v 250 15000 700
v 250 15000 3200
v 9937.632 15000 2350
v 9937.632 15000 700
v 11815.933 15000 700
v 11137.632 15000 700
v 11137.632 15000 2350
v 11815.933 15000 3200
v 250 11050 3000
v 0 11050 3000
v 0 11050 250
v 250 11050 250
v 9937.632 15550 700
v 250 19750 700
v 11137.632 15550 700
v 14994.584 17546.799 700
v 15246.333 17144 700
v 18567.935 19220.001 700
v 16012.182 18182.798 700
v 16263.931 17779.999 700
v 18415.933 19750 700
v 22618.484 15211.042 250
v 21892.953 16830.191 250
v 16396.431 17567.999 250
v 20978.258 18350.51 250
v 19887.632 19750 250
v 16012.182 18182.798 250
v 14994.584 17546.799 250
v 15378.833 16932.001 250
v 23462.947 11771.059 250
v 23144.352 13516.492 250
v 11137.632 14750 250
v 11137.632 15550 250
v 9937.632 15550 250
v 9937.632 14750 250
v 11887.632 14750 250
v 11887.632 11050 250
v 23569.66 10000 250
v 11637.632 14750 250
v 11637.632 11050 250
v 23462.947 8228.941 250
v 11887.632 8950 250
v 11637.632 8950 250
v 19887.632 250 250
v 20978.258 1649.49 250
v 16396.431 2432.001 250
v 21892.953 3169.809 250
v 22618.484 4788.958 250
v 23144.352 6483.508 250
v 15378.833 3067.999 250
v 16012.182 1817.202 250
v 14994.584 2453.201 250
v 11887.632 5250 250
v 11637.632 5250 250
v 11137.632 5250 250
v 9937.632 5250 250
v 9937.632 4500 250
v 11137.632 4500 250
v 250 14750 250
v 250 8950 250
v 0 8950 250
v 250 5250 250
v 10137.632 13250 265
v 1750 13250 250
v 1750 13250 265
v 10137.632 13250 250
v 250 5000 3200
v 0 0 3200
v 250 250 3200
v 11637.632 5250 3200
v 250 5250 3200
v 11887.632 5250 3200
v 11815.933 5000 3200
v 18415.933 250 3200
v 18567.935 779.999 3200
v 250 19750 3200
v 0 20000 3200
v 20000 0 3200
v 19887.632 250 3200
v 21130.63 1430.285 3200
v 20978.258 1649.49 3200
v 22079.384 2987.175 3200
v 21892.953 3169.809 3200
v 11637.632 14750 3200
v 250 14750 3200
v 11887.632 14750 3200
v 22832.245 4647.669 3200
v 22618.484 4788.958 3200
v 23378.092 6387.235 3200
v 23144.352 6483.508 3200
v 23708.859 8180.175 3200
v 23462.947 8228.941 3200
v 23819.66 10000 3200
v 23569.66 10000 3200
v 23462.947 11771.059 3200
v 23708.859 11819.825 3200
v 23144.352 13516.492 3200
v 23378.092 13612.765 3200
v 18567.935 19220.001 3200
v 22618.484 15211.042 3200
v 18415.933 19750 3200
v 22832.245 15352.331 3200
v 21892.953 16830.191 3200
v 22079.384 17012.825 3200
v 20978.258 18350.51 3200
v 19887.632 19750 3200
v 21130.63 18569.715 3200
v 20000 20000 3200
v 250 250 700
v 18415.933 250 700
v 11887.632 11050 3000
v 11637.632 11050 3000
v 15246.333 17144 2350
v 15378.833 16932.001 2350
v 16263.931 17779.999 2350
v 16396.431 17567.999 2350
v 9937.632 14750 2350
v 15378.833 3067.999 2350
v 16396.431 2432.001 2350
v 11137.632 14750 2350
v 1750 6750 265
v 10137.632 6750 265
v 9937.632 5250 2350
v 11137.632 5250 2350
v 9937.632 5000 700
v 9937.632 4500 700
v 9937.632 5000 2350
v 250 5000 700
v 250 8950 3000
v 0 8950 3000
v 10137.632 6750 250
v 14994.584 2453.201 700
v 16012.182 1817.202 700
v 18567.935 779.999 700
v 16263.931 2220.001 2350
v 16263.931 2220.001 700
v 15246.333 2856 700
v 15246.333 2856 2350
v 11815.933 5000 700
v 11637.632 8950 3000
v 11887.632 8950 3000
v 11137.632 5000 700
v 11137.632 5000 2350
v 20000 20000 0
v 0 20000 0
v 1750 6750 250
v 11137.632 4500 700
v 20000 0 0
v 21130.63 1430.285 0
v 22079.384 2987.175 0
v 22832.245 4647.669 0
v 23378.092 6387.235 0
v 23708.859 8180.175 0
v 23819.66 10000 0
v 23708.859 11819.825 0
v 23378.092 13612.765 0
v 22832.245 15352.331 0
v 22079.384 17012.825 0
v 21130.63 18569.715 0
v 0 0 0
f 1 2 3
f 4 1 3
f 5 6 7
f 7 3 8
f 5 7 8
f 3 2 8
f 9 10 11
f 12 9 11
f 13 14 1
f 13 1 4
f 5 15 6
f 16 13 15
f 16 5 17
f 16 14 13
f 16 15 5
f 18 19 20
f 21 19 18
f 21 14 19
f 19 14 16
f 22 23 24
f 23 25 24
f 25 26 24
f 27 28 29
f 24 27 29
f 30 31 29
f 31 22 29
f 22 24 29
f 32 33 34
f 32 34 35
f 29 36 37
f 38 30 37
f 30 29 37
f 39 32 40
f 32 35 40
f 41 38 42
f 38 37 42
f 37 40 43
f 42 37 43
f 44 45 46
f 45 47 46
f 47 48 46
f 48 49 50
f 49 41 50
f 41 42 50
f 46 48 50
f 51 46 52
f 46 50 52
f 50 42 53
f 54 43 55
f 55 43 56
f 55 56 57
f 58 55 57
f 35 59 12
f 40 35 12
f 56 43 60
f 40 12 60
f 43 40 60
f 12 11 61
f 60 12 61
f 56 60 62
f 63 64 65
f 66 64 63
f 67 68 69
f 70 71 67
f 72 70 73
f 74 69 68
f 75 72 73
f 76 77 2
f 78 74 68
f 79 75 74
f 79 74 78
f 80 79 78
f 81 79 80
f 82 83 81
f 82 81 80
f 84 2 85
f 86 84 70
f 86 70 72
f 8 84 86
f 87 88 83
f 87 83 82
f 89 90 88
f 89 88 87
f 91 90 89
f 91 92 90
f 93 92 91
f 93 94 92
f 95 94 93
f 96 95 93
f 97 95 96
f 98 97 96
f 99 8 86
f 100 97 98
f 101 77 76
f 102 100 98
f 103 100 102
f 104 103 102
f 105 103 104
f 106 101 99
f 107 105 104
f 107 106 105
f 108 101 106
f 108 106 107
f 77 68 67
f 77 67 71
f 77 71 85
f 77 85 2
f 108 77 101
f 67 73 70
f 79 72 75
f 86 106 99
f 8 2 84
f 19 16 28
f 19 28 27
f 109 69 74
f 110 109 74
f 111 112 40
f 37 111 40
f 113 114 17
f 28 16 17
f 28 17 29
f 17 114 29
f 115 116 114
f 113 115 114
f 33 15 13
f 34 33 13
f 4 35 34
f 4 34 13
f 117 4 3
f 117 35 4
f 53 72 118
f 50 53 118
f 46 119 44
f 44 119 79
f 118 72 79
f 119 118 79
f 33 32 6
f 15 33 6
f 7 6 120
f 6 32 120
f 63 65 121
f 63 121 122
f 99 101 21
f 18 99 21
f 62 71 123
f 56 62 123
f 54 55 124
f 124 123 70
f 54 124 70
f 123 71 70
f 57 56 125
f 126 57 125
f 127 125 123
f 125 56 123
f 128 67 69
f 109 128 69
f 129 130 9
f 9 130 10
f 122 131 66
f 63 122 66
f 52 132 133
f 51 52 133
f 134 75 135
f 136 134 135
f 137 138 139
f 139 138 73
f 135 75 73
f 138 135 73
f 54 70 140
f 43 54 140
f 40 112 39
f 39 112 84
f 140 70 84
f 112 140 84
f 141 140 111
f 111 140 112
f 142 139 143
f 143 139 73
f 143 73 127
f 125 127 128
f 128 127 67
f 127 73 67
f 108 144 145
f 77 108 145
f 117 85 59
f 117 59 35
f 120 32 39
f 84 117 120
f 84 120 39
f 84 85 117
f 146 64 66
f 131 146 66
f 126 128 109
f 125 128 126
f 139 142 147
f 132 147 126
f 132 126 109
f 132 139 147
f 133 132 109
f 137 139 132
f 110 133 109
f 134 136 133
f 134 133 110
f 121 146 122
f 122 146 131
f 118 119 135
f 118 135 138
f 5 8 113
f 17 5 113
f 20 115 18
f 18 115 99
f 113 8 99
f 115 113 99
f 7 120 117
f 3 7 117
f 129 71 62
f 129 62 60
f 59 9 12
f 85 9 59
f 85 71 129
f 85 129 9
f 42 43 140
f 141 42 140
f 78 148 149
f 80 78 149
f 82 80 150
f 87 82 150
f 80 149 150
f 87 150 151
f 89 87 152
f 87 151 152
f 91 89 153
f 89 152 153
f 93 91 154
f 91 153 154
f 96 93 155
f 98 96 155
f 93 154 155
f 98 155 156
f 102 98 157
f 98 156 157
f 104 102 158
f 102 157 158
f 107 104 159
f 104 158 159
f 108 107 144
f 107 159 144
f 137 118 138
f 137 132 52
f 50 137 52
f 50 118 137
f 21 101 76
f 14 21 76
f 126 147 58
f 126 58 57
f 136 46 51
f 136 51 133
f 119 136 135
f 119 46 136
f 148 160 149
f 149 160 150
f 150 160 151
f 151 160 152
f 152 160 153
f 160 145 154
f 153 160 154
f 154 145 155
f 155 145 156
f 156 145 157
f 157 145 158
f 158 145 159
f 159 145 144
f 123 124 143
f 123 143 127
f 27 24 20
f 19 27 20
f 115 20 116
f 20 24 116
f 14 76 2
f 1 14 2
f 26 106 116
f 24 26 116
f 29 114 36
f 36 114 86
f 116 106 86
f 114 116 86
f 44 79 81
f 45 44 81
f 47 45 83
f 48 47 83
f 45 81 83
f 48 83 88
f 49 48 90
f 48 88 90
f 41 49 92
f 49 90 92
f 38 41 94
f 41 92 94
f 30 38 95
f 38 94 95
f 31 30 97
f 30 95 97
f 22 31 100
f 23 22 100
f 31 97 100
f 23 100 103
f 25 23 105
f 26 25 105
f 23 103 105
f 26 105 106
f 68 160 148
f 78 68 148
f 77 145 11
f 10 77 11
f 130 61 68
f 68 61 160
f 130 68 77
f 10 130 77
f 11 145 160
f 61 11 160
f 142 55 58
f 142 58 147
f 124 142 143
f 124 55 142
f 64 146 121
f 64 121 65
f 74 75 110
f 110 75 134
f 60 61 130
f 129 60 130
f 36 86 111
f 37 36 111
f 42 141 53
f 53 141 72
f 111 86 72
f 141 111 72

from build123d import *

# Parameters (mm, degrees)
F1_DEPTH      = 3200
F2_W          = 11387.6319230904
F2_H          = 9500
F3_DEPTH      = 2950
F4_DEPTH      = 2500
F6_DEPTH      = 15000
F8_W          = 1200
F8_H          = 2100
F9_DEPTH      = 750
F9_DEPTH_BACK = 10300
F12_DEPTH     = 725
F13_W         = 8387.6319230904
F13_H         = 6500
F14_DEPTH     = 15
F15_SIZE      = 1000


# Not quite as in the source:
# - a pattern or mirror of a feature is missing from the dataset's text; its kind, count and spacing are read off the source's solid


with BuildPart() as f1:
    # F0 (on Top) → F1 (new body)
    with BuildSketch(Plane.XY):
        Polygon((0, 20000), (0, 0), (20000, 0), (20000, 10000), (20000, 20000), align=None)
        with BuildLine():
            Line((20000, 10000), (20000, 0))
            ThreePointArc((20000, 0), (22832.2454969418, 4647.6686534036), (23819.6601125011, 10000))
            ThreePointArc((23819.6601125011, 10000), (22832.2454969418, 15352.3313465964), (20000, 20000))
            Line((20000, 20000), (20000, 10000))
        make_face()
    extrude(amount=F1_DEPTH)

    # F2 (on face) → F3 (cut)
    with BuildSketch(Plane.XY.offset(3200)):
        with BuildLine():
            Line((11887.6319230904, 5250), (19887.6319230904, 250))
            ThreePointArc((19887.6319230904, 250), (23569.6601125011, 10000), (19887.6319230904, 19750))
            Line((19887.6319230904, 19750), (11887.6319230904, 14750))
            Line((11887.6319230904, 14750), (11887.6319230904, 5250))
        make_face()
        with Locations((5943.8159615452, 10000)):
            Rectangle(F2_W, F2_H)
    extrude(amount=-F3_DEPTH, mode=Mode.SUBTRACT)

    # F2 (on face) → F4 (cut)
    with BuildSketch(Plane.XY.offset(3200)):
        Polygon((11815.9328664875, 15000), (19415.9328664876, 19750), (250, 19750), (250, 15000), align=None)
        Polygon((250, 5000), (250, 250), (19415.9328664875, 250), (11815.9328664875, 5000), align=None)
    extrude(amount=-F4_DEPTH, mode=Mode.SUBTRACT)

    # F5 (on face) → F6 (cut)
    with BuildSketch(Plane(origin=(0, 0, 0), x_dir=(0, -1, 0), z_dir=(-1, 0, 0))):
        Polygon((-11050, 250), (-10000, 250), (-8950, 250), (-8950, 3000), (-11050, 3000), align=None)
    extrude(amount=-F6_DEPTH, mode=Mode.SUBTRACT)

    # F8 (on face) → F9 (cut, two sides)
    with BuildSketch(Plane(origin=(0, 5250, 0), x_dir=(-1, 0, 0), z_dir=(0, 1, 0))) as f9_sk:
        with Locations((-10537.6319230904, 1300)):
            Rectangle(F8_W, F8_H)
    extrude(amount=-F9_DEPTH, mode=Mode.SUBTRACT)
    extrude(f9_sk.sketch, amount=F9_DEPTH_BACK, mode=Mode.SUBTRACT)

    # F11 (on face) → F12 (cut)
    with BuildSketch(Plane(origin=(-3289.9910328398, 5263.9856525437, 0), x_dir=(0.847998304, 0.52999894, 0), z_dir=(0.52999894, -0.847998304, 0))):
        Polygon((22015.1666404926, 2350), (22015.1666404926, 250), (22615.1666404926, 250), (23215.1666404926, 250), (23215.1666404926, 2350), align=None)
    f12 = extrude(amount=-F12_DEPTH, mode=Mode.SUBTRACT)

    # F12_copies: F12 across plane
    add(f12.mirror(Plane(origin=(0, 10000, 0), x_dir=(0, 0, -1), z_dir=(0, -1, 0))), mode=Mode.SUBTRACT)

    # F15
    f15_edges = [f1.edges().sort_by_distance(p)[0] for p in [
        (19415.932866, 19750, 1950),
        (19415.932866, 250, 1950),
    ]]
    chamfer(f15_edges, length=F15_SIZE)


with BuildPart() as f14:
    # F13 (on face) → F14 (new body)
    with BuildSketch(Plane.XY.offset(250)):
        with Locations((5943.8159615452, 10000)):
            Rectangle(F13_W, F13_H)
    extrude(amount=F14_DEPTH)


solid = Compound([f1.part, f14.part])
